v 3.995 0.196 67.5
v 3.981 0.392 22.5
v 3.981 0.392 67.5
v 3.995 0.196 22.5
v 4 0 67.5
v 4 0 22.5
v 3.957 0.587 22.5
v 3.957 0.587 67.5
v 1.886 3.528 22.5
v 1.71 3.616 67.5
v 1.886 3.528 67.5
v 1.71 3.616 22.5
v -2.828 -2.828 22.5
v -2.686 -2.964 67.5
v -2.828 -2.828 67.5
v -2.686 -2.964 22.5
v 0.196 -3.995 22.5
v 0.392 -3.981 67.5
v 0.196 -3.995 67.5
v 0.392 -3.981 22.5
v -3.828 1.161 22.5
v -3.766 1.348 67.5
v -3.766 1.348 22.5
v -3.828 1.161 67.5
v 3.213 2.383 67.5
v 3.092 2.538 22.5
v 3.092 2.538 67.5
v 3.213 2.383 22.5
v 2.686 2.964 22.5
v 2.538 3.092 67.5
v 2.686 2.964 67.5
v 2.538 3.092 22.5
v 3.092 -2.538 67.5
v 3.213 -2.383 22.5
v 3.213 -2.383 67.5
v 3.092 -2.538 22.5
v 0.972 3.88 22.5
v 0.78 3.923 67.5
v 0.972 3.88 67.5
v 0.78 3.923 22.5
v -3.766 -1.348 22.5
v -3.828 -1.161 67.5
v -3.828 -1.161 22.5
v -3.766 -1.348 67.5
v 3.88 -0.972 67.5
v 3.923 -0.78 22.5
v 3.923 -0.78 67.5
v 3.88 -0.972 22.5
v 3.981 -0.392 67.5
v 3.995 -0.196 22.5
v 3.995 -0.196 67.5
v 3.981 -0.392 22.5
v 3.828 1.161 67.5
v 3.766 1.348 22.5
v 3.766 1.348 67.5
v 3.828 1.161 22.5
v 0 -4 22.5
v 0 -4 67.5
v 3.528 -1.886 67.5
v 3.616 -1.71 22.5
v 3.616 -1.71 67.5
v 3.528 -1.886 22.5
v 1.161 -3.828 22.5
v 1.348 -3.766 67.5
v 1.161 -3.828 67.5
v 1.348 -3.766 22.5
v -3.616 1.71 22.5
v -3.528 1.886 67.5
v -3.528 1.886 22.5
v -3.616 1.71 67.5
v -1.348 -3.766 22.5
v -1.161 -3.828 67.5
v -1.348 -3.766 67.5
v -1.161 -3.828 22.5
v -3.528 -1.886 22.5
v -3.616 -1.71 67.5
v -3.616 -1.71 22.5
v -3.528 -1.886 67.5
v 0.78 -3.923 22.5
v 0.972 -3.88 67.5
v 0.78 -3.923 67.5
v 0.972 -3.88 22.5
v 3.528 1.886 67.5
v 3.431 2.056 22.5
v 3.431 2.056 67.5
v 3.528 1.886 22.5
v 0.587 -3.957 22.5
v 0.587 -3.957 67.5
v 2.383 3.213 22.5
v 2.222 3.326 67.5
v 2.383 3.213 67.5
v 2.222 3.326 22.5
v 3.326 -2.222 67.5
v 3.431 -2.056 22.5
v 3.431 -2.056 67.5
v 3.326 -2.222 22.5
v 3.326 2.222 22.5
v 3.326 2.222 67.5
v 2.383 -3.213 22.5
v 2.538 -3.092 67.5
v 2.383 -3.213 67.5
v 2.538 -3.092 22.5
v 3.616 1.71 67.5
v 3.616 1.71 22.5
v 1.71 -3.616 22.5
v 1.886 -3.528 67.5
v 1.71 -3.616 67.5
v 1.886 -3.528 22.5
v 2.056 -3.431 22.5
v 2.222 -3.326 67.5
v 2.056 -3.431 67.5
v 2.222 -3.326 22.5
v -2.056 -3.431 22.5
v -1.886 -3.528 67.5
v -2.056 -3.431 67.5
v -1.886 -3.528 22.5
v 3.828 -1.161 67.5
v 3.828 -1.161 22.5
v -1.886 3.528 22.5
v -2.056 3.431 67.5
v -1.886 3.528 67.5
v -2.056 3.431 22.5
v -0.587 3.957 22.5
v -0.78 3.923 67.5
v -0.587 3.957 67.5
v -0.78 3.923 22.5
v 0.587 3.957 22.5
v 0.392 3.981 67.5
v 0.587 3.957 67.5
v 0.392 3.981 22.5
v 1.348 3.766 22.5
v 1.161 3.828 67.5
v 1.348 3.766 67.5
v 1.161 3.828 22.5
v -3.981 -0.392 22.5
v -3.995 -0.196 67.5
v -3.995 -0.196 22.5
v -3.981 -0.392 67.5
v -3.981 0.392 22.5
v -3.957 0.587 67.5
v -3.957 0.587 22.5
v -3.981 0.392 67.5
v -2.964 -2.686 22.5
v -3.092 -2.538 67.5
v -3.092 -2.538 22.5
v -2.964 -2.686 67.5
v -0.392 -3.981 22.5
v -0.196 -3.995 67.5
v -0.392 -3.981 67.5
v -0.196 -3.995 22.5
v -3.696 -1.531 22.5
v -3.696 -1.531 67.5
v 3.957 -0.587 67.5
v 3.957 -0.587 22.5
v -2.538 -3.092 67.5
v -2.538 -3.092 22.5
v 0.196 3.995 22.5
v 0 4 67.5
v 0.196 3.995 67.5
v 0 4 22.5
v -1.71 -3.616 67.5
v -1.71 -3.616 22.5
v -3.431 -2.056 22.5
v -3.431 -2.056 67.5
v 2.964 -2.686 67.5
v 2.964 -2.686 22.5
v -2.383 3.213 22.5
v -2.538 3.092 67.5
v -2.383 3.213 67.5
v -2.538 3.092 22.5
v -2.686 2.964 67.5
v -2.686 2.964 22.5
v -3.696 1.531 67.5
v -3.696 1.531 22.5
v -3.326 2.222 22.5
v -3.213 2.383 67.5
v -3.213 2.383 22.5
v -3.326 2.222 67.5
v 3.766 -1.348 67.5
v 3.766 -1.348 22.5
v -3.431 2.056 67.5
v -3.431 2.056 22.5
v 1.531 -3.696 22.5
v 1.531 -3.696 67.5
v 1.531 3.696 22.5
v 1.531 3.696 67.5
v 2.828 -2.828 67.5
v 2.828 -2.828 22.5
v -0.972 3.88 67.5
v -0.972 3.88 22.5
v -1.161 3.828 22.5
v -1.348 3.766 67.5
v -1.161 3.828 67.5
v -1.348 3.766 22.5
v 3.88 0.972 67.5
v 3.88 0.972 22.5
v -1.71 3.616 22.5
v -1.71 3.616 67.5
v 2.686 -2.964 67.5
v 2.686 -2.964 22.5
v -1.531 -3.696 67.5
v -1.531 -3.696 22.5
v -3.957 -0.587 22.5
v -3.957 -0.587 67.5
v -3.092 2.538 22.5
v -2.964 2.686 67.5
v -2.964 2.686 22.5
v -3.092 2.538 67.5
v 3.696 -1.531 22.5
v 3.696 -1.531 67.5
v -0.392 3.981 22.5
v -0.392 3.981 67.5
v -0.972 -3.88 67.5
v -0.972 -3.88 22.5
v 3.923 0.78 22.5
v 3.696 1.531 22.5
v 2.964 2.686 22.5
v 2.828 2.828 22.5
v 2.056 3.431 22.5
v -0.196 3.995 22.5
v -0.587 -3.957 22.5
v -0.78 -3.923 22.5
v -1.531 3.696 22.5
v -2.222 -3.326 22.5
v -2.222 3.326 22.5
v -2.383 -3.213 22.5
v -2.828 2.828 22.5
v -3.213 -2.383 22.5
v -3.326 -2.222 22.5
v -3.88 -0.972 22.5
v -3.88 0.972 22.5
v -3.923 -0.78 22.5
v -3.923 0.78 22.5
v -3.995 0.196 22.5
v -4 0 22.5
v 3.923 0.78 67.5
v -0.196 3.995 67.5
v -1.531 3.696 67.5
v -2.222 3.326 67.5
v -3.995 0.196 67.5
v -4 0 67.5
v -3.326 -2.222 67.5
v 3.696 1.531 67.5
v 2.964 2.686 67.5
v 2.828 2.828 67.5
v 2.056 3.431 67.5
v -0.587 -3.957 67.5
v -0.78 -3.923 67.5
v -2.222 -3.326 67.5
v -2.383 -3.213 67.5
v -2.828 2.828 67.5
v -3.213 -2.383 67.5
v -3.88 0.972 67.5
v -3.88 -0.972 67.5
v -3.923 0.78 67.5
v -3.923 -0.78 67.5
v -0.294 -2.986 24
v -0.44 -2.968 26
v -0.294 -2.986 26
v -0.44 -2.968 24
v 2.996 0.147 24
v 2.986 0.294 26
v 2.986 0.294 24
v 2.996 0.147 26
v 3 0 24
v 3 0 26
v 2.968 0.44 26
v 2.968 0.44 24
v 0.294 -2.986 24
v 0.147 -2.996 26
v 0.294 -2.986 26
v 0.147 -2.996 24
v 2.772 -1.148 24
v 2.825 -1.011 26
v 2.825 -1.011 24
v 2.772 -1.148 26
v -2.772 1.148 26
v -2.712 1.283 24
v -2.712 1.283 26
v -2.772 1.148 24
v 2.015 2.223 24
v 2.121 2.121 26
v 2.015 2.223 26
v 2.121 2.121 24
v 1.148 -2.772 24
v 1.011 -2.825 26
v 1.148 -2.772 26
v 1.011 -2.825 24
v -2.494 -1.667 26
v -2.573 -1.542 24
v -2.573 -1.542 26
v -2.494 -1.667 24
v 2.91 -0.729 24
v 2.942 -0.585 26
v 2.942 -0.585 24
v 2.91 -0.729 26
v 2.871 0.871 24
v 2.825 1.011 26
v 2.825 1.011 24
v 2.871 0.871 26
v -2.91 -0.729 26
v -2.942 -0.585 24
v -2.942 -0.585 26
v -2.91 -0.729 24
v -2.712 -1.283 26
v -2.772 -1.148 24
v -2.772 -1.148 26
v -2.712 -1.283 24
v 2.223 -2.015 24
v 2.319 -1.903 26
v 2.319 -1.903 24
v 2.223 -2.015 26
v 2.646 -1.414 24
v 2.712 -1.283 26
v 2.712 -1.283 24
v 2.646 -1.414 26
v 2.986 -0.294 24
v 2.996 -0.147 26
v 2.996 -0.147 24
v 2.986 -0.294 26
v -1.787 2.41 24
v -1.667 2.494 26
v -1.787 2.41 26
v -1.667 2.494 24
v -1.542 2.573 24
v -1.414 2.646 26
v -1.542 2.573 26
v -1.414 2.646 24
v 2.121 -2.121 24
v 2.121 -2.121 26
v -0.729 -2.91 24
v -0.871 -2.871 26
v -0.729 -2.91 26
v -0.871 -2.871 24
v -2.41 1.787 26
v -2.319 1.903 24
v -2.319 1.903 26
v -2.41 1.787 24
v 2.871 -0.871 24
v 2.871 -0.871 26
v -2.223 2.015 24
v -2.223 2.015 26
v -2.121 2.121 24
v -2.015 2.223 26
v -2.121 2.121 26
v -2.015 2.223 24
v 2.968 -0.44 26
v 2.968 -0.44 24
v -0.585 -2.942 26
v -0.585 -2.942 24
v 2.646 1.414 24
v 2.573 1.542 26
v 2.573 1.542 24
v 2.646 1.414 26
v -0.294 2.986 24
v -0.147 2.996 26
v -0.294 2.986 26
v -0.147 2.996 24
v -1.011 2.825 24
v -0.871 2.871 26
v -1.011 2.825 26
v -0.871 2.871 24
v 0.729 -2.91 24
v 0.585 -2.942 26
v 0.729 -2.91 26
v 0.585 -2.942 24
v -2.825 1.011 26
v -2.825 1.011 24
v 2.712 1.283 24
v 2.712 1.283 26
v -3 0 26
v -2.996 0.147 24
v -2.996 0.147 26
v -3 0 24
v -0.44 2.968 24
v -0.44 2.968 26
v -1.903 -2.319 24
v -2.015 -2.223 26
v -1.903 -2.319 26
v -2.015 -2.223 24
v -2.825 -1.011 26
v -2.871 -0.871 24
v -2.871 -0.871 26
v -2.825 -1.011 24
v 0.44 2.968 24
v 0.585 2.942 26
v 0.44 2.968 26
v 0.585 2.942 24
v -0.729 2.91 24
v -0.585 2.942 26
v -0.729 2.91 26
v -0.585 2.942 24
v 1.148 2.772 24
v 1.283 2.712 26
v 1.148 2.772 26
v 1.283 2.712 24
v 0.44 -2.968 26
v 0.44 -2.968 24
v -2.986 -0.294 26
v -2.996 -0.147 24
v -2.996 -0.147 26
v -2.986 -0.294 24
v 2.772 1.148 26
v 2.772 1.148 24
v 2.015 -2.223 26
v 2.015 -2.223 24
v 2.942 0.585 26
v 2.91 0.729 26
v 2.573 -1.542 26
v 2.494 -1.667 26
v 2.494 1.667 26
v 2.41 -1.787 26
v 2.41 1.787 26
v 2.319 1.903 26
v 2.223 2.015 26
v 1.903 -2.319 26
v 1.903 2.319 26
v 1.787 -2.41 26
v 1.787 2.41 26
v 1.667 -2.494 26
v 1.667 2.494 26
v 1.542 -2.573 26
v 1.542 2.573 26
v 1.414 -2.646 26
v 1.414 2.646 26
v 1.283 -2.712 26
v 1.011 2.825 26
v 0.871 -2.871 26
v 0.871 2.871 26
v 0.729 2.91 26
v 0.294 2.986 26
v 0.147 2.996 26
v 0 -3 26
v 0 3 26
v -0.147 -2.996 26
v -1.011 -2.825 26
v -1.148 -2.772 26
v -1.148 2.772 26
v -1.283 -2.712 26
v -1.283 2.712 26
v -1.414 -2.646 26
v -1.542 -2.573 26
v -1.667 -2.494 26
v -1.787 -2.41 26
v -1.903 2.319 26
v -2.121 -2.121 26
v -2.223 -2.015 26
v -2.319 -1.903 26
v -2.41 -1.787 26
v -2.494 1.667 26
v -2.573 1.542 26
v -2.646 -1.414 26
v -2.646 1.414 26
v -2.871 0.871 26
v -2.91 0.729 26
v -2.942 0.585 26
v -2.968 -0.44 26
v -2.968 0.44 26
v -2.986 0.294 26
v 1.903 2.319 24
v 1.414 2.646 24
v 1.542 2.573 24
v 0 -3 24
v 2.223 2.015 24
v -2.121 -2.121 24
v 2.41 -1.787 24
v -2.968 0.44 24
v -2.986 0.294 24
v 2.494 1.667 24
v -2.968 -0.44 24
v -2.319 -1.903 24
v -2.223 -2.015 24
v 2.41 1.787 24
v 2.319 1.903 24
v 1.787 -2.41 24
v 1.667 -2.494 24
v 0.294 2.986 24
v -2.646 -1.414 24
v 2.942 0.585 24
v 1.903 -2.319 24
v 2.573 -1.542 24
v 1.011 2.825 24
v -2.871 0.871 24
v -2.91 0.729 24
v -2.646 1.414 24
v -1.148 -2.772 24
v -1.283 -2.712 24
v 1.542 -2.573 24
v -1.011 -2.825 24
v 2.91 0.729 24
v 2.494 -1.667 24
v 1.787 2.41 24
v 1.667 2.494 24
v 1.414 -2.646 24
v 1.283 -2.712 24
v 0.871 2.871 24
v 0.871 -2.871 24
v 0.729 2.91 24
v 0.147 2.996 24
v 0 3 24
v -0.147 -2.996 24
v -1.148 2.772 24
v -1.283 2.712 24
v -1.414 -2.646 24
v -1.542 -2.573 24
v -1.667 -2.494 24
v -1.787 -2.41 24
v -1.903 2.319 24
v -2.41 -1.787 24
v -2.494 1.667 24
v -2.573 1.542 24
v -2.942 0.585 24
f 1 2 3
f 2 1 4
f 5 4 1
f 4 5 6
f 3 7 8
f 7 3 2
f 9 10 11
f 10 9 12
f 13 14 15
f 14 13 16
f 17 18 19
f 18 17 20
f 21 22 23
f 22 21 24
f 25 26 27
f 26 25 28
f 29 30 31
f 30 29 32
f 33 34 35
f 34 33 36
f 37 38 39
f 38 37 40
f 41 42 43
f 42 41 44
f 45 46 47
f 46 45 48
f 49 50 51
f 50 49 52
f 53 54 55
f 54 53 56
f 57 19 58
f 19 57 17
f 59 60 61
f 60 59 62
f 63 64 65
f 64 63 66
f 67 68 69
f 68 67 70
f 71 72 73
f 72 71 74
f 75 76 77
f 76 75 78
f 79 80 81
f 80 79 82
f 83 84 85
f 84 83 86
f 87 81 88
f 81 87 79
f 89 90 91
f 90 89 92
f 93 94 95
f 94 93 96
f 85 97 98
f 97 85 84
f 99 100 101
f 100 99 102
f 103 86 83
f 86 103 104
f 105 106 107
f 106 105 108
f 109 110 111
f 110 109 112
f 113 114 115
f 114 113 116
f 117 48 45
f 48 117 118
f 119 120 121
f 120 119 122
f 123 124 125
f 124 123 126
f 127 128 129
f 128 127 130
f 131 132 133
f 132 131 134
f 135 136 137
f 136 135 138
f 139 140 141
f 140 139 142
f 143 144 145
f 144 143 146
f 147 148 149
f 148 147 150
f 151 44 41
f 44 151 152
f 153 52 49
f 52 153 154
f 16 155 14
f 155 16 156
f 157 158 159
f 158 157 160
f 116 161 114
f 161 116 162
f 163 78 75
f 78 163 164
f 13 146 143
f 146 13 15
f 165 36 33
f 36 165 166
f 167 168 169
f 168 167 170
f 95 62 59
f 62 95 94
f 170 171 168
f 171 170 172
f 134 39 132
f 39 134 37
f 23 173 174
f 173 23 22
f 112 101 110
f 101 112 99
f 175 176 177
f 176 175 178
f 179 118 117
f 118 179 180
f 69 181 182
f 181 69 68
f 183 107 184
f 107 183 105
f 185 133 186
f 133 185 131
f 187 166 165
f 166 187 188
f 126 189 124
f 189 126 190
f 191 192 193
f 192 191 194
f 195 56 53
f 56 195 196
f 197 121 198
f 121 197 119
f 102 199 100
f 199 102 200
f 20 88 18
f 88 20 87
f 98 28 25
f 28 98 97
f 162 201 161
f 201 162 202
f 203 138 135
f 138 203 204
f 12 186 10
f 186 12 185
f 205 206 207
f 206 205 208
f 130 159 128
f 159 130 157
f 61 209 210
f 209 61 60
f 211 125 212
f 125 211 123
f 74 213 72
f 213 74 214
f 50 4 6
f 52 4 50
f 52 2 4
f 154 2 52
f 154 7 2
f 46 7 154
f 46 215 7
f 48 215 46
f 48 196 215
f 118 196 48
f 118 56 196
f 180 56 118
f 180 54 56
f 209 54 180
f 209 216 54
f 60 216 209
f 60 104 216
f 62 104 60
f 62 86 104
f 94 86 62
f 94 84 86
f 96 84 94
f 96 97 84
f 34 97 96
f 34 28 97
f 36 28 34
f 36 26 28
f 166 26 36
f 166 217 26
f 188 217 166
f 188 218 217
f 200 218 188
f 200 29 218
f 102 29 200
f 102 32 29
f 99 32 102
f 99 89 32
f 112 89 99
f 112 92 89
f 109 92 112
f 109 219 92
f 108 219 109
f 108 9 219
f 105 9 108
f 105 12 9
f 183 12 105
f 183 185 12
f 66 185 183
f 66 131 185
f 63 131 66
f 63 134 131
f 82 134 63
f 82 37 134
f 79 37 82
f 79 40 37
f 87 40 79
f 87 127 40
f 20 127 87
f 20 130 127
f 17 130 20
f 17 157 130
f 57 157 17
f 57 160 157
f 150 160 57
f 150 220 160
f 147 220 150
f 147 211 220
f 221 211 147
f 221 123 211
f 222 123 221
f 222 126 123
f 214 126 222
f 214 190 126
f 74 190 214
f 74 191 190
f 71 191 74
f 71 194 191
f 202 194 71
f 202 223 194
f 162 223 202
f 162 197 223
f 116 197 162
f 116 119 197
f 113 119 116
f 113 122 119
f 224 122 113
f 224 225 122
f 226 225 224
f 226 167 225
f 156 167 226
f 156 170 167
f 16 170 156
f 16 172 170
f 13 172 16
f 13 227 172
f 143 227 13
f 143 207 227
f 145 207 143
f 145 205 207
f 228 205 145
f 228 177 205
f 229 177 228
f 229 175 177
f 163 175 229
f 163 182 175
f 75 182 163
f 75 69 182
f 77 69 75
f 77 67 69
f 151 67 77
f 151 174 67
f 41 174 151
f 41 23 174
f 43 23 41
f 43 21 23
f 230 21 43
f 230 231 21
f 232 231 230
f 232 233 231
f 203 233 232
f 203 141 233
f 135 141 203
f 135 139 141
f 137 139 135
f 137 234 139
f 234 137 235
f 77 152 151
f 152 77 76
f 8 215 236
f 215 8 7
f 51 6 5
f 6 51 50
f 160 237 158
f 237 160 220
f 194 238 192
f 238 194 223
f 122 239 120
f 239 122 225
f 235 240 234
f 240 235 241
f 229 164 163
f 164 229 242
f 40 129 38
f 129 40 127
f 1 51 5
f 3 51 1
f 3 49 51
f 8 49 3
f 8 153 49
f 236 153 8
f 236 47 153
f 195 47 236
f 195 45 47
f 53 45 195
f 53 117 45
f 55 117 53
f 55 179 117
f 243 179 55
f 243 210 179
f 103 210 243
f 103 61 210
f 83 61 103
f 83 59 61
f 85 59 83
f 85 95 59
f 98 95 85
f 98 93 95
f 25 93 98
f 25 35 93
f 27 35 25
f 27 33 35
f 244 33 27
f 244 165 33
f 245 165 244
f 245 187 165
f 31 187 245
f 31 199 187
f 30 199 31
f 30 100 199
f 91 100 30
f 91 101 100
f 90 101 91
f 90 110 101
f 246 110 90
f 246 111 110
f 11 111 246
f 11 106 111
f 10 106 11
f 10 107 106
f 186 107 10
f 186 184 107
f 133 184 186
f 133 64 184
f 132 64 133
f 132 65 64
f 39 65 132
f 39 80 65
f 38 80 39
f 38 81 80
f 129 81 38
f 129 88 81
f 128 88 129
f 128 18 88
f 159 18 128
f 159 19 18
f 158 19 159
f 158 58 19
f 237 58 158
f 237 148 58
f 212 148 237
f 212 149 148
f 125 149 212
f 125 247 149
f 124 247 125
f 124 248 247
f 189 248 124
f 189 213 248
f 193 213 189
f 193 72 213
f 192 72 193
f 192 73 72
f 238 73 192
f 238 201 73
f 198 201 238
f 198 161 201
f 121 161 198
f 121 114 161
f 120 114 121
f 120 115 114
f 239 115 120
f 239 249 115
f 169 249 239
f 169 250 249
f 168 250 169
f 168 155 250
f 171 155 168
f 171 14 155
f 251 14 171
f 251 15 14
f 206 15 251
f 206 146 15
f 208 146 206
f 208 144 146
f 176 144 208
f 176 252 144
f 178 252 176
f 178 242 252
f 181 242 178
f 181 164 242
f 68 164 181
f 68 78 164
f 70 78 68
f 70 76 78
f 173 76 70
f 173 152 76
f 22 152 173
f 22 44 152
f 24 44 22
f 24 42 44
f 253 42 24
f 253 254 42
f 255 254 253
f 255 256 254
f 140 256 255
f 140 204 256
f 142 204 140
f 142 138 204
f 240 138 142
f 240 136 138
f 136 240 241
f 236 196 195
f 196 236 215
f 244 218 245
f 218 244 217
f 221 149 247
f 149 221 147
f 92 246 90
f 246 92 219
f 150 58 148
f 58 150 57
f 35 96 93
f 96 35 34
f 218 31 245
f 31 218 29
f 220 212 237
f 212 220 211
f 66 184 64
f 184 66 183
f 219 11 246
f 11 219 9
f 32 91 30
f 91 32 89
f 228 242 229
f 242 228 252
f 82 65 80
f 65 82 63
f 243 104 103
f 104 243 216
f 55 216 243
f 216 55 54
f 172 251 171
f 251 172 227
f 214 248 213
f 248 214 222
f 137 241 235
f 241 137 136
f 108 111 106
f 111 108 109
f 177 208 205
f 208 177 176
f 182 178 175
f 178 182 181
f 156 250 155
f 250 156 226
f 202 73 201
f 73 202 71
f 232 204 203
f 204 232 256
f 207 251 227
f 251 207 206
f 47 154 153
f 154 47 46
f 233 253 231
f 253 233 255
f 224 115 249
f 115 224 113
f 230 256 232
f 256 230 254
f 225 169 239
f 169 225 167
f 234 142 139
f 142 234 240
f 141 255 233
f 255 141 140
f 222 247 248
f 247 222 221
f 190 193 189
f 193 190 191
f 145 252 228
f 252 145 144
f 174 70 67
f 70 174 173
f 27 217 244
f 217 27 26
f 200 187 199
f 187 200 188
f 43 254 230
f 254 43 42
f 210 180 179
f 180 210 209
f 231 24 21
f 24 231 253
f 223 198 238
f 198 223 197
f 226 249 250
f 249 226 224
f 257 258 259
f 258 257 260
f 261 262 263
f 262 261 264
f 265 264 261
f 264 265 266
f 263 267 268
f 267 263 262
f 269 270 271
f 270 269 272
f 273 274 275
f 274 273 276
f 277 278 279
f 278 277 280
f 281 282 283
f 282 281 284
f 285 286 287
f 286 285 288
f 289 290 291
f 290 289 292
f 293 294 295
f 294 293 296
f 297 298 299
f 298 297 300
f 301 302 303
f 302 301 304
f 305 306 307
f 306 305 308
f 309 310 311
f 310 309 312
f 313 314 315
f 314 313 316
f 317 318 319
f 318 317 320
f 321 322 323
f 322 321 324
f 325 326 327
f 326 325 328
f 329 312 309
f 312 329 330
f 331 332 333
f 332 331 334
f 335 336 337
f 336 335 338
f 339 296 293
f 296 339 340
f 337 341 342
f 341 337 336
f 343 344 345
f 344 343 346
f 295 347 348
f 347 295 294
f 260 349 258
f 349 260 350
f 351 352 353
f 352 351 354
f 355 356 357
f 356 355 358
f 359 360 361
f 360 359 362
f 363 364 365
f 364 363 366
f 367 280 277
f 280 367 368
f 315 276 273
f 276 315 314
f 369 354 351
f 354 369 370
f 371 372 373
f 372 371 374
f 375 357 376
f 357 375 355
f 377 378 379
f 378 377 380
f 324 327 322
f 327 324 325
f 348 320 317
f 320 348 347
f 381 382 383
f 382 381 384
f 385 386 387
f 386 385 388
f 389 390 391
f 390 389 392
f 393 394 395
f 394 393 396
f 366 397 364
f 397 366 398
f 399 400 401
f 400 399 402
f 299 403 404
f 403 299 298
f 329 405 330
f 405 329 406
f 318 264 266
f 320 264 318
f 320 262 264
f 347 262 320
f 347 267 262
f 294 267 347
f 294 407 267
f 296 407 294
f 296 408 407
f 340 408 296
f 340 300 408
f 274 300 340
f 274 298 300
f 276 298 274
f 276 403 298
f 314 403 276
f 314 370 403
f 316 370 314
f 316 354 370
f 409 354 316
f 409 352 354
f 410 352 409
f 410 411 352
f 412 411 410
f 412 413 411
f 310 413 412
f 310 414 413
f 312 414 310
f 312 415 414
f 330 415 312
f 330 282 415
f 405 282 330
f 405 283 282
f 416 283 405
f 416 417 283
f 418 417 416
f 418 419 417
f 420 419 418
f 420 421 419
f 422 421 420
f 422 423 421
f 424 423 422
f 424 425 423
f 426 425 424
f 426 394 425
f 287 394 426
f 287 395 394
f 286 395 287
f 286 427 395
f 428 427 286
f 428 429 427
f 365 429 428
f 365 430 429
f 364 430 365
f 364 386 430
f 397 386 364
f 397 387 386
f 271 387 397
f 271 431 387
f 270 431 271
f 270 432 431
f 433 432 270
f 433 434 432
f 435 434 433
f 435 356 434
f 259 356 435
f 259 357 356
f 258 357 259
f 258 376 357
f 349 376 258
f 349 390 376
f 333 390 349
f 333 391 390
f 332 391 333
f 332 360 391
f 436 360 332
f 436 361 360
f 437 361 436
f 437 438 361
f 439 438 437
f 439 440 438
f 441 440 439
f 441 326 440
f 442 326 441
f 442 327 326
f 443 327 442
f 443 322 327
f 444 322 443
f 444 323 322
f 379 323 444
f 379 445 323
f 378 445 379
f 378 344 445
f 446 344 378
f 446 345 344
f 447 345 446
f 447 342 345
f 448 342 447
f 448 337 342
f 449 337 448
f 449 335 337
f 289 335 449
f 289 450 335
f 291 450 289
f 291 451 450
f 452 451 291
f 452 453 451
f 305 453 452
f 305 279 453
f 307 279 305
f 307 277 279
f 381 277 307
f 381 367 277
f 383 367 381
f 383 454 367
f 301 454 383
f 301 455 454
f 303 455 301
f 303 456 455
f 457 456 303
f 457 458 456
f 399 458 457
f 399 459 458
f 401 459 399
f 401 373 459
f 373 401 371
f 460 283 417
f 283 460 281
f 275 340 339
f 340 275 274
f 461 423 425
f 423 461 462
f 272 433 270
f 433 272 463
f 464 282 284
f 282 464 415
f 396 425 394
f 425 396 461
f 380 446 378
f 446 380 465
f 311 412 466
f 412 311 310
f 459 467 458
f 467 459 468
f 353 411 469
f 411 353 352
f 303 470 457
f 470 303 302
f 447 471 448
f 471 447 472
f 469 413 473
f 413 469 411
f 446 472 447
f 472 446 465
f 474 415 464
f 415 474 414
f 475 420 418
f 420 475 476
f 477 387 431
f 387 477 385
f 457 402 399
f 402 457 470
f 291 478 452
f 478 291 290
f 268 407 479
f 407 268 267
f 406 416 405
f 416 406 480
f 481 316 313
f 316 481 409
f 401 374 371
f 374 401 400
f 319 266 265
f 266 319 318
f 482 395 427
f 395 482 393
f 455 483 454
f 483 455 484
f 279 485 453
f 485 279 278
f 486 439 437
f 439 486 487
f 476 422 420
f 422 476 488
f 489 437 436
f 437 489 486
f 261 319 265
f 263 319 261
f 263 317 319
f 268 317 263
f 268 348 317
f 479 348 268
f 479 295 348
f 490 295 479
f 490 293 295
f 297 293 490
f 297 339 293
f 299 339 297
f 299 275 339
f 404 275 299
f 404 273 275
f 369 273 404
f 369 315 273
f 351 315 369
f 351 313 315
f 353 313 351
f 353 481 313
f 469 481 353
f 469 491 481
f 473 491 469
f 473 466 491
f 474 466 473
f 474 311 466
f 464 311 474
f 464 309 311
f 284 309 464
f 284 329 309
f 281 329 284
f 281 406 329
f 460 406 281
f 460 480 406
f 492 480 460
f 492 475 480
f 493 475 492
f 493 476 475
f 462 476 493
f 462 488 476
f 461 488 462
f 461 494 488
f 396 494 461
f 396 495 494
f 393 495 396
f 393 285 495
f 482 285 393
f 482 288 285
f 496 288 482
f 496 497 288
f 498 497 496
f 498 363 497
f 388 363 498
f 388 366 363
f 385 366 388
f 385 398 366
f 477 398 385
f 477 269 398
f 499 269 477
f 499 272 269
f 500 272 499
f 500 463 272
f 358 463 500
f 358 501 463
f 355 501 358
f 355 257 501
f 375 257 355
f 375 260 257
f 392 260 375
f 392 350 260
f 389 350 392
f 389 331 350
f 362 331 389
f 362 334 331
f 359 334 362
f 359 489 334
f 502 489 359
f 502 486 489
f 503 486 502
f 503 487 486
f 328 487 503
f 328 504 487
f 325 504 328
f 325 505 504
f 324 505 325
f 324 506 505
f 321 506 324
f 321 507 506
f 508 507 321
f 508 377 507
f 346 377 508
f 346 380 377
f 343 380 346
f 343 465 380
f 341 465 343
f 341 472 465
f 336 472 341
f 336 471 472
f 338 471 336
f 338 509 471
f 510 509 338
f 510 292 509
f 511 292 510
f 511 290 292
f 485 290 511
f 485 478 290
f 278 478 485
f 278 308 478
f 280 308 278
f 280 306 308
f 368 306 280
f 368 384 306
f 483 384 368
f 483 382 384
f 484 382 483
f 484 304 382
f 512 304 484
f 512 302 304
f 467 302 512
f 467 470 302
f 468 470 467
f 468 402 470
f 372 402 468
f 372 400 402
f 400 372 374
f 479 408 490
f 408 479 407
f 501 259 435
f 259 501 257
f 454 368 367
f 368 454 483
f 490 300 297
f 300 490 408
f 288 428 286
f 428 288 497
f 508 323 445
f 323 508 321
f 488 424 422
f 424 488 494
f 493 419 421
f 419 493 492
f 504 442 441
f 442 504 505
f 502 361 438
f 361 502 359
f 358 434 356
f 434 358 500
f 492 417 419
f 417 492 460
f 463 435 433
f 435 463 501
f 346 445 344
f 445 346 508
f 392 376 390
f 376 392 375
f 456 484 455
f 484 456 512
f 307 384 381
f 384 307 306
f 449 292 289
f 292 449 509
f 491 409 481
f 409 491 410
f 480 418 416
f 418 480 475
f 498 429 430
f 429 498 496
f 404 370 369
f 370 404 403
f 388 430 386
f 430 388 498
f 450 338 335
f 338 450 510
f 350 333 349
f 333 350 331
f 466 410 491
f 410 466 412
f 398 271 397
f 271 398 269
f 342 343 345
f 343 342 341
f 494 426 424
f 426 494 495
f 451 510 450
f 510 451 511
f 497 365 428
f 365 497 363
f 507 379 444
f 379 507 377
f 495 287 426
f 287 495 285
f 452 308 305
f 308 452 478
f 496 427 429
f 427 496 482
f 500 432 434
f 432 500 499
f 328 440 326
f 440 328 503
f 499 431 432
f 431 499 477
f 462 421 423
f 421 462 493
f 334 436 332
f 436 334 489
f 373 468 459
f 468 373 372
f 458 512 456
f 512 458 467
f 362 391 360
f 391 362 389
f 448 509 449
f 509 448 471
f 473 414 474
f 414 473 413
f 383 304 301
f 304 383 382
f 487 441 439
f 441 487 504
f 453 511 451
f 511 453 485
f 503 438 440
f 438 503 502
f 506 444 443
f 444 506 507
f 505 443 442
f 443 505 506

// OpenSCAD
$fn = 128;

// --- Dimensions ---
// Handle
d_handle = 8;
h_handle = 45;
z_handle_start = 0;
z_handle_end = 45;

// Cone
d_cone_bottom = 8;
d_cone_top = 3;
z_cone_start = 45;
z_cone_end = 62;

// Tip
d_tip = 3;
z_tip_center = 62;

// Grooves
n_grooves = 4;
w_groove = 2; // Width in Z
d_groove = 1; // Depth
z_groove_centers = [10, 15, 20, 25];

// --- Main Body Construction ---
difference() {
    union() {
        // 1. Cylindrical Handle
        // Centered at z = 22.5 (half of 45)
        translate([0, 0, z_handle_start + h_handle/2]) {
            cylinder(h = h_handle, d = d_handle);
        }

        // 2. Conical Section
        // Constructed using rotate_extrude with a polygon profile.
        // Profile: Line from (radius_bottom, 0) to (radius_top, height)
        h_cone = z_cone_end - z_cone_start;
        r_start = d_cone_bottom / 2;
        r_end = d_cone_top / 2;
        
        // The rotate_extrude creates a shape centered at its own origin.
        // We need to translate it so it starts at z_cone_start.
        // The profile is in the XY plane. The extrusion is along Z.
        // Points: [x, y]. x is radius, y is height.
        // Line from (r_start, 0) to (r_end, h_cone).
        
        translate([0, 0, z_cone_start]) {
            rotate_extrude() {
                polygon(points = [[r_start, 0], [r_end, h_cone]]);
            }
        }

        // 3. Tip Sphere
        translate([0, 0, z_tip_center]) {
            sphere(d = d_tip);
        }
    }

    // --- Cut Grooves ---
    // Grooves are cylindrical holes cut into the handle.
    // They are centered at specific Z heights.
    // Width in Z is w_groove.
    // Depth is d_groove.
    // Diameter of groove cutter = Handle Diameter - 2 * Depth
    
    d_cutter = d_handle - 2 * d_groove;
    
    for (z_c = z_groove_centers) {
        translate([0, 0, z_c - w_groove/2]) {
            cylinder(
                h = w_groove,
                d = d_cutter,
                center = [0, 0, 0]
            );
        }
    }
}
